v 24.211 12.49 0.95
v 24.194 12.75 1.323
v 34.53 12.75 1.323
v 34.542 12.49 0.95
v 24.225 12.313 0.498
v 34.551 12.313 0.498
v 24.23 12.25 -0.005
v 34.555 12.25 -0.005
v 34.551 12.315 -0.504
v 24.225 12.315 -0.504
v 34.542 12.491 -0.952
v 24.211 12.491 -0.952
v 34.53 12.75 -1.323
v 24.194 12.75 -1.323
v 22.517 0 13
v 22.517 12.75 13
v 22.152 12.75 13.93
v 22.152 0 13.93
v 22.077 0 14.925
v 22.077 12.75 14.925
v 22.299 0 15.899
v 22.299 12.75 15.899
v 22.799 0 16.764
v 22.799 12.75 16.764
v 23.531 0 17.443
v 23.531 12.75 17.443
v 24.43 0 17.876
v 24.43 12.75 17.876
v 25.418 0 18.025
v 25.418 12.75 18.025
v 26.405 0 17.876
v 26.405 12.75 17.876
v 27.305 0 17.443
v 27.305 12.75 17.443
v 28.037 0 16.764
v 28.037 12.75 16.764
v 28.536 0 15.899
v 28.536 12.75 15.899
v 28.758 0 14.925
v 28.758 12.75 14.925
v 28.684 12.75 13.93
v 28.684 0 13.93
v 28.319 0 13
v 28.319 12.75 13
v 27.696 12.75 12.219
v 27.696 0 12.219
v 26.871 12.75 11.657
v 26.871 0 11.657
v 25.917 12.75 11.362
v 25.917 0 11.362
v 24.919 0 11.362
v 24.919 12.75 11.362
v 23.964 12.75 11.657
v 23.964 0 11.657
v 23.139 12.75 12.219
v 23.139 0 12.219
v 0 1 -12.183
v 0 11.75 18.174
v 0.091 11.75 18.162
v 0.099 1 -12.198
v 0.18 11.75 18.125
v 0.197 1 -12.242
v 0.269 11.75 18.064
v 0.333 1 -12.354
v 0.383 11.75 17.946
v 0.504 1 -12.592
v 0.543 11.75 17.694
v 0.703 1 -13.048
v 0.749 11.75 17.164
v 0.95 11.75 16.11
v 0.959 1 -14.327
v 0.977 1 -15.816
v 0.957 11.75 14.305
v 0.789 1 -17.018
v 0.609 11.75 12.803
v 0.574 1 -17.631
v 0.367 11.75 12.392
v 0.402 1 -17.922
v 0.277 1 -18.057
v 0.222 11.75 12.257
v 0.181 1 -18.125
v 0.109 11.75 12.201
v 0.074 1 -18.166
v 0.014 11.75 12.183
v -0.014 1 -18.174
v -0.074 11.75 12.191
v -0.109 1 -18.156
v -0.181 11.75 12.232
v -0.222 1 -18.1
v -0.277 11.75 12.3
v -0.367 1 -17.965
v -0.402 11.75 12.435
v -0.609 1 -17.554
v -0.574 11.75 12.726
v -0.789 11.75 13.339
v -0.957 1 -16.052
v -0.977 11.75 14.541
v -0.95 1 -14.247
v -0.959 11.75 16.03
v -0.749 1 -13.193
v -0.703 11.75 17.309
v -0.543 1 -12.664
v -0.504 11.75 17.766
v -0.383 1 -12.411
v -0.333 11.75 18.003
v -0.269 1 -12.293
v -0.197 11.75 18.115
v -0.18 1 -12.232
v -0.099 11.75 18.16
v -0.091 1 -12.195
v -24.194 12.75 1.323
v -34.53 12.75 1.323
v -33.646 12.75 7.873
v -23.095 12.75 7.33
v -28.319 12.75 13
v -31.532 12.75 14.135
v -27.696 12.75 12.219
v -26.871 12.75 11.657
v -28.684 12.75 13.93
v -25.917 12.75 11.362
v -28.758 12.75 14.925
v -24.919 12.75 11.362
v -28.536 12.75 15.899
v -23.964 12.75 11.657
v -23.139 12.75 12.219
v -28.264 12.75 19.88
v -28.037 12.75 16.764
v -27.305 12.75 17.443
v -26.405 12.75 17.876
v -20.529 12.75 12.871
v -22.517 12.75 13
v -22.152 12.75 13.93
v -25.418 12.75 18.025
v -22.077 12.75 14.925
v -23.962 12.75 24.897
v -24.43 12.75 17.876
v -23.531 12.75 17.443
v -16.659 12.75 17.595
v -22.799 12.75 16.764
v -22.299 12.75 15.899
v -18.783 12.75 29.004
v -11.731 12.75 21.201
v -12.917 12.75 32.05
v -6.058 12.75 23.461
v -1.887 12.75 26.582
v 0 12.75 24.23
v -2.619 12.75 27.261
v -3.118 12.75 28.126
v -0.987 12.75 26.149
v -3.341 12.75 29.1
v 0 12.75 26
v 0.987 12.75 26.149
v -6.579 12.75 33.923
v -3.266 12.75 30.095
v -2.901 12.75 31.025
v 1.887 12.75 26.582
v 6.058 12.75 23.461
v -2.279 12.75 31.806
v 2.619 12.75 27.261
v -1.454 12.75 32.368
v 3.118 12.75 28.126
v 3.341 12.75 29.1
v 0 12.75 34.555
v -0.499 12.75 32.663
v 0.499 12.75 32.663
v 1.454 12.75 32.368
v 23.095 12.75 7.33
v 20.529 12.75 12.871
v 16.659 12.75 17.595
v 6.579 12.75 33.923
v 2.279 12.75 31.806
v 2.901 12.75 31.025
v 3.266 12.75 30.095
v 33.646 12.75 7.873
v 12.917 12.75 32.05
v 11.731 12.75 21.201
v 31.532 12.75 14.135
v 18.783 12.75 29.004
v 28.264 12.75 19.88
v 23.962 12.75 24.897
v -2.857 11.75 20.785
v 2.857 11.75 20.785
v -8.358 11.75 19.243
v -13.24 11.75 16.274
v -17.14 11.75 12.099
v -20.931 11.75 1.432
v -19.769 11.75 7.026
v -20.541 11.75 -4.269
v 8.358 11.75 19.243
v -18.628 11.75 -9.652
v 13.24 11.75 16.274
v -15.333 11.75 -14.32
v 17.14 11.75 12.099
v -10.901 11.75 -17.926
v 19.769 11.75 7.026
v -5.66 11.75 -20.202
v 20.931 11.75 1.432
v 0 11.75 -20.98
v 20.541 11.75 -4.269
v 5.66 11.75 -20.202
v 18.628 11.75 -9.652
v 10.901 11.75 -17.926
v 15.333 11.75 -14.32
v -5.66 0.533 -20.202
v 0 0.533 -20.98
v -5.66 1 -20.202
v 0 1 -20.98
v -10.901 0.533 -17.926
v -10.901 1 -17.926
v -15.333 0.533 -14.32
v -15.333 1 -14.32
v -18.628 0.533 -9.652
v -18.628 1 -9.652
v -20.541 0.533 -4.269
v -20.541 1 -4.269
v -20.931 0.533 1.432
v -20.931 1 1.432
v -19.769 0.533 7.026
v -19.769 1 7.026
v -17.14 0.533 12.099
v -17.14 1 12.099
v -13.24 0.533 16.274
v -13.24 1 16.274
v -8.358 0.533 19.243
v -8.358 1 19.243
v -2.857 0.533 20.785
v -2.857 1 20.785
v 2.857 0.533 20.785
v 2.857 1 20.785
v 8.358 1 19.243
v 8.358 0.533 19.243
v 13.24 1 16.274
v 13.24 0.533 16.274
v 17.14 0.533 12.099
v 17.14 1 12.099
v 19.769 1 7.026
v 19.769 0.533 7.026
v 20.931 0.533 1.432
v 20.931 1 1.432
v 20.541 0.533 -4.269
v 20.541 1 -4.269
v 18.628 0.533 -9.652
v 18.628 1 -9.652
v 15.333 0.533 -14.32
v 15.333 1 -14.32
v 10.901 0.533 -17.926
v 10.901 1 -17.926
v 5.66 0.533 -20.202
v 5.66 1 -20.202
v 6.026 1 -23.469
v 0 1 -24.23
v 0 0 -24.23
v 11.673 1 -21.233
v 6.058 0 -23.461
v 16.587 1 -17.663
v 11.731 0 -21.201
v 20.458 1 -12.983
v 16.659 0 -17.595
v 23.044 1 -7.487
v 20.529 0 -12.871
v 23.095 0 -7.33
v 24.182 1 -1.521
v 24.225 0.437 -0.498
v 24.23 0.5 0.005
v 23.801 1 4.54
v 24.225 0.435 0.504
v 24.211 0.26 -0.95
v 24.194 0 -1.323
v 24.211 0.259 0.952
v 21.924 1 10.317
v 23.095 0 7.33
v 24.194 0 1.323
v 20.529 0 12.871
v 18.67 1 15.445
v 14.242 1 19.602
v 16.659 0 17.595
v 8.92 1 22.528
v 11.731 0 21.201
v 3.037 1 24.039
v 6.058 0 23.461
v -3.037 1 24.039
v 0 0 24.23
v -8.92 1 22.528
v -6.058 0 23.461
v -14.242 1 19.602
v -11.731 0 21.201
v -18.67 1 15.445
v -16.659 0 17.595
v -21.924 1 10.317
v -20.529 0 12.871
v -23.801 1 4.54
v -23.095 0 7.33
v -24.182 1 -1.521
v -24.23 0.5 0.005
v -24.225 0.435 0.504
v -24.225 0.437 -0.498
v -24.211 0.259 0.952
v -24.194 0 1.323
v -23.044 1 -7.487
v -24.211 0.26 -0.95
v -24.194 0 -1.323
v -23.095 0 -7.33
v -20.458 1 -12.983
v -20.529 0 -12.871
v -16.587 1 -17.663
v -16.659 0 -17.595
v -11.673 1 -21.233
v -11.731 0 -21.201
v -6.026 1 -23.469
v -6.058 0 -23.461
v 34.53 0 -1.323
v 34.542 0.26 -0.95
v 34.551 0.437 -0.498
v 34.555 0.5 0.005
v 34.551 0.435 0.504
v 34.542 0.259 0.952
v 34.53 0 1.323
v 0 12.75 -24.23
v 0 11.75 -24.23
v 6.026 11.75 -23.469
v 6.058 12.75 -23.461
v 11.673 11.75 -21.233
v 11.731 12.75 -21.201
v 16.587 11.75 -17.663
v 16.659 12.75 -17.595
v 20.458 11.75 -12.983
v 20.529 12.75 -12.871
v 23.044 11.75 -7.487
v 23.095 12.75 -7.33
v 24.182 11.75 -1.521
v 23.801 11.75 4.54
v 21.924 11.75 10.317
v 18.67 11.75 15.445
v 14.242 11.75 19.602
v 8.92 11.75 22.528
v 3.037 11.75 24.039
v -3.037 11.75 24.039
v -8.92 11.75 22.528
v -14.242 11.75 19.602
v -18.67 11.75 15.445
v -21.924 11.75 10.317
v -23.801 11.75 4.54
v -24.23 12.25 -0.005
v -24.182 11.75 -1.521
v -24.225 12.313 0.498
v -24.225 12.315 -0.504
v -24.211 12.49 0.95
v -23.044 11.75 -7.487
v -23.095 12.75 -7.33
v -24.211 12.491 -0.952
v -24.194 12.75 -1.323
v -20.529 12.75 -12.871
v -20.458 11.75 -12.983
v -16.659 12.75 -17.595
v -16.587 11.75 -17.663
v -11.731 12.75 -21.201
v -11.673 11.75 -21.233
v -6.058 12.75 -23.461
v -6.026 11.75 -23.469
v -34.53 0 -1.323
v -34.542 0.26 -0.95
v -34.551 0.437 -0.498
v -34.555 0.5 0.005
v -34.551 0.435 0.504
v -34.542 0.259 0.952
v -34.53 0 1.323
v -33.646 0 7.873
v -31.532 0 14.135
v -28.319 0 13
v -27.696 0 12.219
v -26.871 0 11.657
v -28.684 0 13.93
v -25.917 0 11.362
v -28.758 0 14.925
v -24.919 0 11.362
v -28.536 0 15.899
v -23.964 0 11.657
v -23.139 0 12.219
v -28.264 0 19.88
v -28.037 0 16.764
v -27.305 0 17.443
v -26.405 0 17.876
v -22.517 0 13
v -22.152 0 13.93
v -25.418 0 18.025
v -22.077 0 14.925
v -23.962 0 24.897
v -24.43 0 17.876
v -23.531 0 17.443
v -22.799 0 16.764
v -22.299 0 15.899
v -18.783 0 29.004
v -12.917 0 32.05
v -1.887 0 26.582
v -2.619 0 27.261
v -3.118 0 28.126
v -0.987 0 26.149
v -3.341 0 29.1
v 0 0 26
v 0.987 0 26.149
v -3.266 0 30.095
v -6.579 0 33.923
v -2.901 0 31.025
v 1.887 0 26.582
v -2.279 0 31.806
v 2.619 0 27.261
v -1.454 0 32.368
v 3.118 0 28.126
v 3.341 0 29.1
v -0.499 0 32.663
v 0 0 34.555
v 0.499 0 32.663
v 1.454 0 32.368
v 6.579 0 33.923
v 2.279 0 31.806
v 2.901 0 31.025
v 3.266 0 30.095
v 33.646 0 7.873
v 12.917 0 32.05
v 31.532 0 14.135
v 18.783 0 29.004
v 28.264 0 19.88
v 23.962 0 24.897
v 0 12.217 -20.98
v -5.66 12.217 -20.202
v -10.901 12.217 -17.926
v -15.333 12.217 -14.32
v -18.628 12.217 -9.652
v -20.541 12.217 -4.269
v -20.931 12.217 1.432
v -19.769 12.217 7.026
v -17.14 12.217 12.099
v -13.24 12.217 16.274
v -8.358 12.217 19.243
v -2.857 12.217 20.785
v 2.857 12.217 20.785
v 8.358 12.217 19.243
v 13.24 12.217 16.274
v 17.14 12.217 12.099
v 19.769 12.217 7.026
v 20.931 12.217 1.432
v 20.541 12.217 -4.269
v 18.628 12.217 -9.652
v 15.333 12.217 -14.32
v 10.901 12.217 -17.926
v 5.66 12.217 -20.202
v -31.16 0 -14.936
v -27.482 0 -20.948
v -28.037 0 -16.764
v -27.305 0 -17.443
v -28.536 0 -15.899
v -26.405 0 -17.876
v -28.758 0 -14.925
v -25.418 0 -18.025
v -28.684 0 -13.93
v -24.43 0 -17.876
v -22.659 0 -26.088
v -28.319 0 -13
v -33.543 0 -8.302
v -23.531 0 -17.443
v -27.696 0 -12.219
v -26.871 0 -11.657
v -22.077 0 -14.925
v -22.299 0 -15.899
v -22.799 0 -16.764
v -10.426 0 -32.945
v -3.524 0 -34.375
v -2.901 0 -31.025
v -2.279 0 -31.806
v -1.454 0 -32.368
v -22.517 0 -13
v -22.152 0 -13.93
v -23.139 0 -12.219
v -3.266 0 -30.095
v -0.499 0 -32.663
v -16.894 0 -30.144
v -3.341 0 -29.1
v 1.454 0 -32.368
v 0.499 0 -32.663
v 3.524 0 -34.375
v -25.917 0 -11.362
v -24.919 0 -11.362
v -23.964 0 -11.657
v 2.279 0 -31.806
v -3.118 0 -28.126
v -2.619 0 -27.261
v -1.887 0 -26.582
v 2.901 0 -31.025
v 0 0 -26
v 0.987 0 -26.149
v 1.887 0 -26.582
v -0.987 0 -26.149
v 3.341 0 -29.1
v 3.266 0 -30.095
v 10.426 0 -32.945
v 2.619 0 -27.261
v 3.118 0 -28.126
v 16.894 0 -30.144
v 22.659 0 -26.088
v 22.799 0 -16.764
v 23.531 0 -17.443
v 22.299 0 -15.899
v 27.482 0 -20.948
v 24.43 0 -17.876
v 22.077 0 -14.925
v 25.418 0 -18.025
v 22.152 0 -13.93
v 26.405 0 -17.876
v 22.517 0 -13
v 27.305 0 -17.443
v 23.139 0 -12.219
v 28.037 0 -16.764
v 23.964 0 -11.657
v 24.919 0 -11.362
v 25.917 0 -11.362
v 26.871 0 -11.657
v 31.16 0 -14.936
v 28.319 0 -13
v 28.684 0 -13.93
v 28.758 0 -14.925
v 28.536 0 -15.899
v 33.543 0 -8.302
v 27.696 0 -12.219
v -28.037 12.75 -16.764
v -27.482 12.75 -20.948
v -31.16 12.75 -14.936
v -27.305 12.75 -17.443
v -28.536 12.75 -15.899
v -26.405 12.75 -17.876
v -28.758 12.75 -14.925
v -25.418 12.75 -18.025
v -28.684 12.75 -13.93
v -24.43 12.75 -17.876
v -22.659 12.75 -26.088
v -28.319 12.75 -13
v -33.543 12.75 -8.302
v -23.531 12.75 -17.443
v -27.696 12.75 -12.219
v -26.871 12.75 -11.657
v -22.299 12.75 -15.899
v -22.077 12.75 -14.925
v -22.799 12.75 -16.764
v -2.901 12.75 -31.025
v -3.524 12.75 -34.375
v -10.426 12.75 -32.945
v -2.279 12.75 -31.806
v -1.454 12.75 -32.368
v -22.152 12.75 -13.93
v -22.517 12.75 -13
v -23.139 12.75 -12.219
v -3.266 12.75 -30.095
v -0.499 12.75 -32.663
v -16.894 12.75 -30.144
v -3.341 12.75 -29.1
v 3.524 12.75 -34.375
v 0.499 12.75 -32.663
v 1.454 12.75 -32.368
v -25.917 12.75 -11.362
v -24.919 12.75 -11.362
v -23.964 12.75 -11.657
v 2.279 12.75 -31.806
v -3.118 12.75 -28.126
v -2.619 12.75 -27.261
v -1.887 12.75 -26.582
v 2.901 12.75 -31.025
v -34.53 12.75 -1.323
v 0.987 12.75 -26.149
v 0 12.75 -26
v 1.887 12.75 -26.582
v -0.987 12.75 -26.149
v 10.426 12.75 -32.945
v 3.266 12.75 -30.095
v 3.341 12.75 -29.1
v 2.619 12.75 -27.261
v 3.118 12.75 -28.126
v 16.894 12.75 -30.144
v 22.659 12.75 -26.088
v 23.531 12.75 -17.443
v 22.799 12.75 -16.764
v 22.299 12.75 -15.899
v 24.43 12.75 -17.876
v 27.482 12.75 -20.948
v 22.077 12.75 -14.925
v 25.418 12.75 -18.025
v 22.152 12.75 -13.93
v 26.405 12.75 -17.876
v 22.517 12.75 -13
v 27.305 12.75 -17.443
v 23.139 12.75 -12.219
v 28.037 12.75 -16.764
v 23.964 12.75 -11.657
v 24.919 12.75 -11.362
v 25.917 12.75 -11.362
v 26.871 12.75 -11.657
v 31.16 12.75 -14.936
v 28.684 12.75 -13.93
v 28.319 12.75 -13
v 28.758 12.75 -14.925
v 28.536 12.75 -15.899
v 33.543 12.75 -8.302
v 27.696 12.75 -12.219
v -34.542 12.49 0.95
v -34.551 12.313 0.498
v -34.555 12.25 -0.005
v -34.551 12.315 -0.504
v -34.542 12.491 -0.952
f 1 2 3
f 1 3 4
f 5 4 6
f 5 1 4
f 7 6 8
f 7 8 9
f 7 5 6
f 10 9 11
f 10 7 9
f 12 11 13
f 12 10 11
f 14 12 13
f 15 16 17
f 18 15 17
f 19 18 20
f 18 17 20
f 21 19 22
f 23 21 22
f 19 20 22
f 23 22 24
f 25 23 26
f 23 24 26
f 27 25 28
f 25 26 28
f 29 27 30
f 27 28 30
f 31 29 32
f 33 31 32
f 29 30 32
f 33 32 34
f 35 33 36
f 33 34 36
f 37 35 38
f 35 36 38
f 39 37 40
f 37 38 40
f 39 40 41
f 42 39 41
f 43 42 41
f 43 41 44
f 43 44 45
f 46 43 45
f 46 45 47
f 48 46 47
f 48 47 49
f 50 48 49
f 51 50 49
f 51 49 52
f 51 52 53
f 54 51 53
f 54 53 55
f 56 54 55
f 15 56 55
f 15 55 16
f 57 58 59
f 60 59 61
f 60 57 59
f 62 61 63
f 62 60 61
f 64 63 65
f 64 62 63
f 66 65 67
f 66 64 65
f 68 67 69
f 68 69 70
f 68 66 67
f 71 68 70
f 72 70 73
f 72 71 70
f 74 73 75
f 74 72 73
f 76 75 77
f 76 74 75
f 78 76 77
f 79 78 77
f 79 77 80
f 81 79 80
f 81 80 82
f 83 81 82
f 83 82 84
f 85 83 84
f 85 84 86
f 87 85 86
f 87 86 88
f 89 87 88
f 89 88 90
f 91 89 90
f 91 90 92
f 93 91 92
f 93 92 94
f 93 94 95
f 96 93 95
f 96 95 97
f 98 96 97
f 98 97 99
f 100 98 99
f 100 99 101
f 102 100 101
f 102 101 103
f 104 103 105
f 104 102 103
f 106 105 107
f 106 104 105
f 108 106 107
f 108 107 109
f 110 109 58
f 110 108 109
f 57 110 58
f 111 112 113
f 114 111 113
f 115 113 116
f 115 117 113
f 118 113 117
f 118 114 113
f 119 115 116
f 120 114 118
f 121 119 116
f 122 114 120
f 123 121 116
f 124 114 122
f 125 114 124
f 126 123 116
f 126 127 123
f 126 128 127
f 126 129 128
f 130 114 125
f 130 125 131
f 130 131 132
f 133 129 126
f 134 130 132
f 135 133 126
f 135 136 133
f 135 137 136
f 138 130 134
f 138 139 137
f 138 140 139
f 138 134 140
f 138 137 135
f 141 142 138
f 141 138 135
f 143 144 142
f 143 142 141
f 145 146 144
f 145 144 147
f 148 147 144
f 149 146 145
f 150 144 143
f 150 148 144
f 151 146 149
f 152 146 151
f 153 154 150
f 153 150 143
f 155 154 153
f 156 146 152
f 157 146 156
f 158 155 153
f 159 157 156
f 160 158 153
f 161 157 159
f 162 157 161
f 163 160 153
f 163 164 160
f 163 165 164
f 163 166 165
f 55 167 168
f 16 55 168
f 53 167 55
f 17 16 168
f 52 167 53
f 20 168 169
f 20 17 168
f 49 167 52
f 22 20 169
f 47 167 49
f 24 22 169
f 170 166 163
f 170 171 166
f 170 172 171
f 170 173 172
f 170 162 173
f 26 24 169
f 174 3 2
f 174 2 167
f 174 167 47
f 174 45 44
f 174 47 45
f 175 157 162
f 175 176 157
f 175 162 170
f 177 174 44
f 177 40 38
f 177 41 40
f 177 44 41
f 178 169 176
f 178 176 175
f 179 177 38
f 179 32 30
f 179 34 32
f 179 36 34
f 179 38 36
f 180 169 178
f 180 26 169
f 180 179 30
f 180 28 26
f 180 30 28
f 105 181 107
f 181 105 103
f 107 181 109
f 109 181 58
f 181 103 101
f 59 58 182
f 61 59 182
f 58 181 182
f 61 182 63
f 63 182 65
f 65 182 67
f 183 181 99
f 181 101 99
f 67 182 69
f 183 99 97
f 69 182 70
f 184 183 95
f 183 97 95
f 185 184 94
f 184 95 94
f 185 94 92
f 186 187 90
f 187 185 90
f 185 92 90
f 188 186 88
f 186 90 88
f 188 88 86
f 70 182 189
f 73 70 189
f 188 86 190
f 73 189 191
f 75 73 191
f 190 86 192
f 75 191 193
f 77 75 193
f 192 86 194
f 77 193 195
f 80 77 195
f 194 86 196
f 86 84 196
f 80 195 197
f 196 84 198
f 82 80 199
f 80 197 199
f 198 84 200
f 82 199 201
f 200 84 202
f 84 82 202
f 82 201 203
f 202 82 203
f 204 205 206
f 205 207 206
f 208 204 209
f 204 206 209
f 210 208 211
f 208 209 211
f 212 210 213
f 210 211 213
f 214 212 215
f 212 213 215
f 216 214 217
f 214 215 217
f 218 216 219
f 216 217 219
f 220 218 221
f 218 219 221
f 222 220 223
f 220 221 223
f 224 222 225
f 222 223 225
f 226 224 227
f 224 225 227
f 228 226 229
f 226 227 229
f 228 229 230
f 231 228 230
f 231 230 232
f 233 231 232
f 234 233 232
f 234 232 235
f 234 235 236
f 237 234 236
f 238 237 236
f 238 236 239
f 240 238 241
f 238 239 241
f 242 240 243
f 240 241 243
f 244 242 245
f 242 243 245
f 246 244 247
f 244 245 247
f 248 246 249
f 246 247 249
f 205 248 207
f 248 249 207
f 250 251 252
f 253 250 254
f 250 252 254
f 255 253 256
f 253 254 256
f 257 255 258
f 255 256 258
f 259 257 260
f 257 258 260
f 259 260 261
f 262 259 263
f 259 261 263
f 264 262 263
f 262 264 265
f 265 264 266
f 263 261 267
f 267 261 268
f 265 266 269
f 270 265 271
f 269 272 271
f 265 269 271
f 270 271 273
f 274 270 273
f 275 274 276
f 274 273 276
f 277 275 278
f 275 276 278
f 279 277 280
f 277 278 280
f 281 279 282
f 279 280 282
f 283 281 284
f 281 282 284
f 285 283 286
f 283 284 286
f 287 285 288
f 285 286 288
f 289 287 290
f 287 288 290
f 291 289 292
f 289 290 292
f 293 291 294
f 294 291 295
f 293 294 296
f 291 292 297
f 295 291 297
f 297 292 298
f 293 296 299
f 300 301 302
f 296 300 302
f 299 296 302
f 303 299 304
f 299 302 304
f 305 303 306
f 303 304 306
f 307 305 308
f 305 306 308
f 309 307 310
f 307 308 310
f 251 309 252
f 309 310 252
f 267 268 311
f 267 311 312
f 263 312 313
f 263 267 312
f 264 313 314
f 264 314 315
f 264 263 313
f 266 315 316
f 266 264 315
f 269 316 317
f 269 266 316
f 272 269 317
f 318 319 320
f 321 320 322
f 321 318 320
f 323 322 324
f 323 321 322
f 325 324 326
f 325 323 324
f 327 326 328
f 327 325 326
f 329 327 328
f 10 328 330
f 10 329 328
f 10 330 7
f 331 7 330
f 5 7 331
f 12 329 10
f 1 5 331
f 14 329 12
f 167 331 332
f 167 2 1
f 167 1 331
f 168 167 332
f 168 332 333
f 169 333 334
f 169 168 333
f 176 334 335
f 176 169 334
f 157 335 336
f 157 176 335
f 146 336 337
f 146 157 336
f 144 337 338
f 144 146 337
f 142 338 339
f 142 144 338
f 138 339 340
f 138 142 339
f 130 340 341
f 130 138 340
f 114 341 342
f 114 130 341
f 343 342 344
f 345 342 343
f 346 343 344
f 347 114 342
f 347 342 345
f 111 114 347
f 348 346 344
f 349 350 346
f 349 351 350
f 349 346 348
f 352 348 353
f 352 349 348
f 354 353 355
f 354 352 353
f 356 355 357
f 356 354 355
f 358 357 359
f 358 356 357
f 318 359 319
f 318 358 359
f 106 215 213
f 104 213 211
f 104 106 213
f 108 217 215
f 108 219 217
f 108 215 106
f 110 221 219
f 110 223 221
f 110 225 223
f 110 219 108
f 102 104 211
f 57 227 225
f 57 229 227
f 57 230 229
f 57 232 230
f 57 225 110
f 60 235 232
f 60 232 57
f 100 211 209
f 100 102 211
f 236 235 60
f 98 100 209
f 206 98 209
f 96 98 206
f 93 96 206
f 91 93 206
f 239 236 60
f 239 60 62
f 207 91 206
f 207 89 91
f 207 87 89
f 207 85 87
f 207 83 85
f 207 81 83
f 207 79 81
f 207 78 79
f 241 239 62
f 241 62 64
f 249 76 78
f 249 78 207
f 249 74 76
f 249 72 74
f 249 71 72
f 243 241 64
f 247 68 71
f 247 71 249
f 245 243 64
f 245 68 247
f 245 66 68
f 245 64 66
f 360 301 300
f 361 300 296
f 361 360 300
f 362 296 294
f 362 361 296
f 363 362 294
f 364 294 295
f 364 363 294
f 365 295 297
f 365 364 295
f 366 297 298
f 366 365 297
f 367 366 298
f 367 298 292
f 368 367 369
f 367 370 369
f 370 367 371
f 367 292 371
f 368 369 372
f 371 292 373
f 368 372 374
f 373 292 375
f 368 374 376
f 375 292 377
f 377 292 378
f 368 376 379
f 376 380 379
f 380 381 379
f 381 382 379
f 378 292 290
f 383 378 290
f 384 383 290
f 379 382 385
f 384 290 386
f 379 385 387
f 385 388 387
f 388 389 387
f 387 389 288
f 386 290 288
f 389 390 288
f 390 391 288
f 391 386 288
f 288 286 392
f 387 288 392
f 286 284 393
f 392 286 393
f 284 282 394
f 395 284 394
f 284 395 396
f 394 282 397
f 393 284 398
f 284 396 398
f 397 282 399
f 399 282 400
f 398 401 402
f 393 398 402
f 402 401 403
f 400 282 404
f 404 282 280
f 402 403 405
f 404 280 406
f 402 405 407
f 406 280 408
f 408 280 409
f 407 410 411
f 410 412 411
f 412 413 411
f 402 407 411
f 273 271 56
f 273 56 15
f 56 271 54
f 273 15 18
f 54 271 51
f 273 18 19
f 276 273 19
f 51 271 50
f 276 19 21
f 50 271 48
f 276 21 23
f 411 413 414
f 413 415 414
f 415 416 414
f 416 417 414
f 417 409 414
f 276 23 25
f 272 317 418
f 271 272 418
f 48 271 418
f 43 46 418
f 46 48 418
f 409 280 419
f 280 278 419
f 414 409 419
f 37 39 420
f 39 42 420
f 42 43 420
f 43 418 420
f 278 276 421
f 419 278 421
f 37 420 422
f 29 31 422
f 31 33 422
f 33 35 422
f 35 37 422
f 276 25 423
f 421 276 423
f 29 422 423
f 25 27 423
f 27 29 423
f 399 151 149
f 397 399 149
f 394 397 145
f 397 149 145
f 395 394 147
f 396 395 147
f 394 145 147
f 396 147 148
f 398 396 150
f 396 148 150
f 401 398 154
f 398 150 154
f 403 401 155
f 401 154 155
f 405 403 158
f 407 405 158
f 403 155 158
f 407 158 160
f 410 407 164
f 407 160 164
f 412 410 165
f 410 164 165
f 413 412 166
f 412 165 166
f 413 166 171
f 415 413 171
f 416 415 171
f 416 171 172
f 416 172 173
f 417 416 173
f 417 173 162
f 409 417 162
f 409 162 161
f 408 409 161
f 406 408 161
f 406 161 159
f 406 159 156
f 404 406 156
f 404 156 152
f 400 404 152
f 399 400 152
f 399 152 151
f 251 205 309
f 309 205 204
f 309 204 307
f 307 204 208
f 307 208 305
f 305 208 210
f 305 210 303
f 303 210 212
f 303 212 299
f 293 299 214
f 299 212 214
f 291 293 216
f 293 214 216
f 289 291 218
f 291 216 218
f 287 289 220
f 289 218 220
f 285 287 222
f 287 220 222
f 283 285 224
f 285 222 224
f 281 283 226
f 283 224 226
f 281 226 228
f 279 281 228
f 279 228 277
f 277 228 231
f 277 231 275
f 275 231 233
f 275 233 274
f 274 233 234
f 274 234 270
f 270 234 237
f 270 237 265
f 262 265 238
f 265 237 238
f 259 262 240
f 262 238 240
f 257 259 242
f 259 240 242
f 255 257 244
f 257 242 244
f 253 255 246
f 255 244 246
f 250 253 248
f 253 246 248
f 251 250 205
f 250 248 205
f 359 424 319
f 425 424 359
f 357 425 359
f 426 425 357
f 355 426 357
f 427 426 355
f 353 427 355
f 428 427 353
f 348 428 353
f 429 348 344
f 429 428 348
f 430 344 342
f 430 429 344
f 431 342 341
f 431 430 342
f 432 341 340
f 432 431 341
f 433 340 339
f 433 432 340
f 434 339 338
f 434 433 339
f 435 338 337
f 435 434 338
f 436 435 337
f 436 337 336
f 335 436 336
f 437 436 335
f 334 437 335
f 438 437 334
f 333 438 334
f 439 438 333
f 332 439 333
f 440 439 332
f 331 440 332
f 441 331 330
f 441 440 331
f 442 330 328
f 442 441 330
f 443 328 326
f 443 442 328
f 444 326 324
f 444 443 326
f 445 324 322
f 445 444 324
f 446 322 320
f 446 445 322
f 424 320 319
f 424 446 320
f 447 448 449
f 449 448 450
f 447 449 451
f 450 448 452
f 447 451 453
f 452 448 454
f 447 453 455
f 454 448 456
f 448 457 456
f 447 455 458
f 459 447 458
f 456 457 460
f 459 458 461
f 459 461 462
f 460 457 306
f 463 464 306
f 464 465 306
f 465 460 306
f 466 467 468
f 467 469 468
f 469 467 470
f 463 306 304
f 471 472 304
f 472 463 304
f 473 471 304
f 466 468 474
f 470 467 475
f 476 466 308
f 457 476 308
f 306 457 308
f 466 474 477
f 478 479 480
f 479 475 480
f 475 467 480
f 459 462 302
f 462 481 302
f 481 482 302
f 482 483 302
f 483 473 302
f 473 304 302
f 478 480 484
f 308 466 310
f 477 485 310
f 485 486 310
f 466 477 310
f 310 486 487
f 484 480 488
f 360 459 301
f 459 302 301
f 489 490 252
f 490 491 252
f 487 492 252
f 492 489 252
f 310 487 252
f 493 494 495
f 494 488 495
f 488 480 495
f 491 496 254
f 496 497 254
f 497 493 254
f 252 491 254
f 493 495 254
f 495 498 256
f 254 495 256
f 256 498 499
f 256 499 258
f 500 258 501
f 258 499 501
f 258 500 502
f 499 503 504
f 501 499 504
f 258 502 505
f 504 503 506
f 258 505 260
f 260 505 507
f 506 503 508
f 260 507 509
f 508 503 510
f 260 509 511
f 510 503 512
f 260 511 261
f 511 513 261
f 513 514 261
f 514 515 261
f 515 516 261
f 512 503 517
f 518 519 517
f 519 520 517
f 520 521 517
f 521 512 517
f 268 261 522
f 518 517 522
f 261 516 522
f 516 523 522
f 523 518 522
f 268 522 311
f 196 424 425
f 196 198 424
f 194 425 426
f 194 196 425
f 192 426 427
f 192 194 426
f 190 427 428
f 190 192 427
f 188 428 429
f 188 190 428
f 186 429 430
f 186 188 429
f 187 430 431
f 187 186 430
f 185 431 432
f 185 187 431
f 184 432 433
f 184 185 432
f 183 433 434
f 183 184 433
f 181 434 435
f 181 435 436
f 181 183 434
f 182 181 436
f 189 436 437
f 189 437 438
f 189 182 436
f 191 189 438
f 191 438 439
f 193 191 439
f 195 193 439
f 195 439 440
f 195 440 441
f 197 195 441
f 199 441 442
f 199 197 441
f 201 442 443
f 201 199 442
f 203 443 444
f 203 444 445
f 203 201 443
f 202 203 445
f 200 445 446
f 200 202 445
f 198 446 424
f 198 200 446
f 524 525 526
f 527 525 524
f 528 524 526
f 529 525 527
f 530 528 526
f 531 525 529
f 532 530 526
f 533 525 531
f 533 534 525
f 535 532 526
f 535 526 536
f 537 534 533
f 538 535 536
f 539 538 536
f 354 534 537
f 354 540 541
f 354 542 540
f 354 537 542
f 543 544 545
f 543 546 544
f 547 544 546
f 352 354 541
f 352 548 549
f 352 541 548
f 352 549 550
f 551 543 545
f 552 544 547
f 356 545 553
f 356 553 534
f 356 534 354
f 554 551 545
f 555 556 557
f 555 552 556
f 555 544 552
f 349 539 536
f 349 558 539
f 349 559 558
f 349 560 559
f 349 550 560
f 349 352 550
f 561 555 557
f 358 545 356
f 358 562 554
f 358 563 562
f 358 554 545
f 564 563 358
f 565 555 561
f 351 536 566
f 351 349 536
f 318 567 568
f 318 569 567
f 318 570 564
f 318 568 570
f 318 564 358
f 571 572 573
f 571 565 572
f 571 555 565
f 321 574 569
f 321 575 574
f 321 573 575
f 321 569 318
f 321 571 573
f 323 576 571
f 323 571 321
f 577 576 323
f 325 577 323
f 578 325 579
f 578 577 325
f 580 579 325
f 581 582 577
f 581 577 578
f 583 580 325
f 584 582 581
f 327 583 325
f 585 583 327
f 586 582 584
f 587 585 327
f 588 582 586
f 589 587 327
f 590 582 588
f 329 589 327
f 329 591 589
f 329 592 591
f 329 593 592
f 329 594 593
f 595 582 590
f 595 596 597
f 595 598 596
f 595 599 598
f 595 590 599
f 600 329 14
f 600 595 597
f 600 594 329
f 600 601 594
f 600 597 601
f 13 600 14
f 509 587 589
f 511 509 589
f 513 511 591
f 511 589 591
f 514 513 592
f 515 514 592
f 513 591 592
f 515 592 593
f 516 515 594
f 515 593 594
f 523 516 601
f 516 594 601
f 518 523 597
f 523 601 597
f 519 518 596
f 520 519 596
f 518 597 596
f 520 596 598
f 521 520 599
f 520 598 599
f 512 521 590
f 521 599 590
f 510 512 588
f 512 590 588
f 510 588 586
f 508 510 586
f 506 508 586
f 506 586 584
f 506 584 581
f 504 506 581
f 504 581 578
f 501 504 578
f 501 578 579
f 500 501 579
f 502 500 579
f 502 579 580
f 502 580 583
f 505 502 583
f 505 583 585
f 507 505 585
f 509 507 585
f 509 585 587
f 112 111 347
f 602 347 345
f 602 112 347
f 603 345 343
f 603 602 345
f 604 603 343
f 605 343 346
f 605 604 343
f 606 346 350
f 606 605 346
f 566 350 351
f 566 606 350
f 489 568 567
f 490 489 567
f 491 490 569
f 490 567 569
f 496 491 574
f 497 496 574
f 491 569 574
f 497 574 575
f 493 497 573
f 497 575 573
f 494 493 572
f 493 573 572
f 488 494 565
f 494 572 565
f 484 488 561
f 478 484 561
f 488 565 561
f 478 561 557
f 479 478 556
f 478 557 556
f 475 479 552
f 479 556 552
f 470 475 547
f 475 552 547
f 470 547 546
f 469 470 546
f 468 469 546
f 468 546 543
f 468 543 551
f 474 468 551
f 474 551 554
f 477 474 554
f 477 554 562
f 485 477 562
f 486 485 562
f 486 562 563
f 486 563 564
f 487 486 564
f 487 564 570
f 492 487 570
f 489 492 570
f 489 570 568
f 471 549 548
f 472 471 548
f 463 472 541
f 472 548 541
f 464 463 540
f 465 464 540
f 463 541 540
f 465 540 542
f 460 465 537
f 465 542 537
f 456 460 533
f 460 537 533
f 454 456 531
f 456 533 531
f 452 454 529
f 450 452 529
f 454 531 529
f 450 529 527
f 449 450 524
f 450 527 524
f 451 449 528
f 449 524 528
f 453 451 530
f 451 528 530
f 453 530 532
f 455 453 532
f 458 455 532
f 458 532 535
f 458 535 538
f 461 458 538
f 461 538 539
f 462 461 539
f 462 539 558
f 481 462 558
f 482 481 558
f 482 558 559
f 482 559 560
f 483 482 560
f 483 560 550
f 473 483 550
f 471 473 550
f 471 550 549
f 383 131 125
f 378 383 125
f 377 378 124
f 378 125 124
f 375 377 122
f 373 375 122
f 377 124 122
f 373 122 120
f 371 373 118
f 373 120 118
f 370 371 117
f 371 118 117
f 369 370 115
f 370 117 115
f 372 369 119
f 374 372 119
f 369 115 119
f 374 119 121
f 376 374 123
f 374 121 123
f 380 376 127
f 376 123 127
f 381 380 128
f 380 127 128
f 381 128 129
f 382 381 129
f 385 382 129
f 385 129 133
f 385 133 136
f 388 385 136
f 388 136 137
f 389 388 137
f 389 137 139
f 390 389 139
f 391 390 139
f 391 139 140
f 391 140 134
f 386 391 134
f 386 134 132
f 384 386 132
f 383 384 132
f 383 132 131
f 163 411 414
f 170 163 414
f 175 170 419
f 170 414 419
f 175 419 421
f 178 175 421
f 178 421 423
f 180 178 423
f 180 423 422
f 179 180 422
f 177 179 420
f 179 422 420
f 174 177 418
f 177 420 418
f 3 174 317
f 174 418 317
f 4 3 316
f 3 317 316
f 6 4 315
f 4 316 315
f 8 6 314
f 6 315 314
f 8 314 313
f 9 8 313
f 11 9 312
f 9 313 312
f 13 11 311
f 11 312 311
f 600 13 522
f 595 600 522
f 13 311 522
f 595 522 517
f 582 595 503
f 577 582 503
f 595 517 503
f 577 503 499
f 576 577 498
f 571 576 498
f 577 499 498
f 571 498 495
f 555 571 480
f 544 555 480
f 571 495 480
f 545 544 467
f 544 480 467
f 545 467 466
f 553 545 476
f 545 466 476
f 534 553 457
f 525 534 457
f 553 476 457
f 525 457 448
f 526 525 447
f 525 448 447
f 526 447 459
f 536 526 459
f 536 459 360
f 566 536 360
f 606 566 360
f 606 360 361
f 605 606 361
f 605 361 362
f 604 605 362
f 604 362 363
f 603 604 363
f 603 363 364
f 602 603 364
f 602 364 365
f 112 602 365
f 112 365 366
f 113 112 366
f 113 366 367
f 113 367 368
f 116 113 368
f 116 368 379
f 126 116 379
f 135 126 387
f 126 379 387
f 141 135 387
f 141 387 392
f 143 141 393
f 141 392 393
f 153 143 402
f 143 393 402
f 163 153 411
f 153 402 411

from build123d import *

# Parameters (mm, degrees)
SKETCH1_R               = 34.555
BOSS_EXTRUDE1_DEPTH     = 12.75
SKETCH2_R               = 3.35
CUT_EXTRUDE1_DEPTH      = 51.504044888
CIRPATTERN1_COUNT       = 6
SKETCH6_R               = 24.23
CUT_EXTRUDE3_DEPTH      = 1
CUT_EXTRUDE2_DEPTH      = 51.504044888
CUT_EXTRUDE2_DEPTH_BACK = 51.504044888
SKETCH4_R               = 2
CUT_EXTRUDE4_DEPTH      = 52.727217057
CUT_EXTRUDE4_DEPTH_BACK = 52.727217057
SKETCH9_R               = 1


with BuildPart() as part:
    # Sketch1 → Boss-Extrude1 (new body)
    with BuildSketch(Plane(origin=(0, 0, 0), x_dir=(1, 0, 0), z_dir=(0, 1, 0))):
        with Locations(Location((0, 0, 0), (0, 0, 270))):
            Circle(SKETCH1_R)
    extrude(amount=BOSS_EXTRUDE1_DEPTH)

    # Sketch2 → Cut-Extrude1 (cut, through all)
    with BuildSketch(Plane(origin=(0, 12.75, 0), x_dir=(1, 0, 0), z_dir=(0, 1, 0))):
        with Locations(Location((0, 29.35, 0), (0, 0, 270))):
            Circle(SKETCH2_R)
    cut_extrude1 = extrude(amount=-CUT_EXTRUDE1_DEPTH, mode=Mode.SUBTRACT)

    # CirPattern1: Cut-Extrude1 ×6 about axis
    cirpattern1_axis = Axis((0, 0, 0), (0, 1, 0))
    for i in range(1, CIRPATTERN1_COUNT):
        add(cut_extrude1.rotate(cirpattern1_axis, i * 360 / CIRPATTERN1_COUNT), mode=Mode.SUBTRACT)

    # Sketch6 → Cut-Extrude3 (cut)
    with BuildSketch(Plane.XZ):
        with Locations(Location((0, 0, 0), (0, 0, 270))):
            Circle(SKETCH6_R)
    cut_extrude3 = extrude(amount=-CUT_EXTRUDE3_DEPTH, mode=Mode.SUBTRACT)

    # Sketch7 → Revolve1 (revolve)
    with BuildSketch(Plane(origin=(0, 0, 0), x_dir=(0, 0, -1), z_dir=(1, 0, 0))):
        Polygon((24.23, 1), (20.98, 0.5334), (20.98, 1), align=None)
    revolve1 = revolve(axis=Axis((0, 0, 0), (0, 1, 0)))

    # Mirror1: Cut-Extrude3 across plane
    add(cut_extrude3.mirror(Plane(origin=(0, 6.375, 0), x_dir=(0, 0, 1), z_dir=(0, -1, 0))), mode=Mode.SUBTRACT)

    # Mirror2: Revolve1 across plane
    add(revolve1.mirror(Plane(origin=(0, 6.375, 0), x_dir=(0, 0, 1), z_dir=(0, -1, 0))))

    # Sketch4 → Cut-Extrude2 (cut, two sides: drawn at the far end of the back side and taken through both)
    with BuildSketch(Plane(origin=(0, 0, 0), x_dir=(0, 0, -1), z_dir=(1, 0, 0)).offset(-CUT_EXTRUDE2_DEPTH_BACK)):
        with Locations((0, 14.25)):
            Circle(SKETCH4_R)
        with Locations((0, -1.5)):
            Circle(SKETCH4_R)
    extrude(amount=CUT_EXTRUDE2_DEPTH + CUT_EXTRUDE2_DEPTH_BACK, mode=Mode.SUBTRACT)

    # Sketch9 → Cut-Extrude4 (cut, two sides: drawn at the far end of the back side and taken through both)
    with BuildSketch(Plane(origin=(0, 0.710347248, 2.005958746), x_dir=(1, 0, 0), z_dir=(0, 0.33380685923377496, 0.942641491092177)).offset(-CUT_EXTRUDE4_DEPTH_BACK)):
        with Locations(Location((0, 6.009339506, 0), (0, 0, 270))):
            Circle(SKETCH9_R)
    extrude(amount=CUT_EXTRUDE4_DEPTH + CUT_EXTRUDE4_DEPTH_BACK, mode=Mode.SUBTRACT)


solid = part.part
